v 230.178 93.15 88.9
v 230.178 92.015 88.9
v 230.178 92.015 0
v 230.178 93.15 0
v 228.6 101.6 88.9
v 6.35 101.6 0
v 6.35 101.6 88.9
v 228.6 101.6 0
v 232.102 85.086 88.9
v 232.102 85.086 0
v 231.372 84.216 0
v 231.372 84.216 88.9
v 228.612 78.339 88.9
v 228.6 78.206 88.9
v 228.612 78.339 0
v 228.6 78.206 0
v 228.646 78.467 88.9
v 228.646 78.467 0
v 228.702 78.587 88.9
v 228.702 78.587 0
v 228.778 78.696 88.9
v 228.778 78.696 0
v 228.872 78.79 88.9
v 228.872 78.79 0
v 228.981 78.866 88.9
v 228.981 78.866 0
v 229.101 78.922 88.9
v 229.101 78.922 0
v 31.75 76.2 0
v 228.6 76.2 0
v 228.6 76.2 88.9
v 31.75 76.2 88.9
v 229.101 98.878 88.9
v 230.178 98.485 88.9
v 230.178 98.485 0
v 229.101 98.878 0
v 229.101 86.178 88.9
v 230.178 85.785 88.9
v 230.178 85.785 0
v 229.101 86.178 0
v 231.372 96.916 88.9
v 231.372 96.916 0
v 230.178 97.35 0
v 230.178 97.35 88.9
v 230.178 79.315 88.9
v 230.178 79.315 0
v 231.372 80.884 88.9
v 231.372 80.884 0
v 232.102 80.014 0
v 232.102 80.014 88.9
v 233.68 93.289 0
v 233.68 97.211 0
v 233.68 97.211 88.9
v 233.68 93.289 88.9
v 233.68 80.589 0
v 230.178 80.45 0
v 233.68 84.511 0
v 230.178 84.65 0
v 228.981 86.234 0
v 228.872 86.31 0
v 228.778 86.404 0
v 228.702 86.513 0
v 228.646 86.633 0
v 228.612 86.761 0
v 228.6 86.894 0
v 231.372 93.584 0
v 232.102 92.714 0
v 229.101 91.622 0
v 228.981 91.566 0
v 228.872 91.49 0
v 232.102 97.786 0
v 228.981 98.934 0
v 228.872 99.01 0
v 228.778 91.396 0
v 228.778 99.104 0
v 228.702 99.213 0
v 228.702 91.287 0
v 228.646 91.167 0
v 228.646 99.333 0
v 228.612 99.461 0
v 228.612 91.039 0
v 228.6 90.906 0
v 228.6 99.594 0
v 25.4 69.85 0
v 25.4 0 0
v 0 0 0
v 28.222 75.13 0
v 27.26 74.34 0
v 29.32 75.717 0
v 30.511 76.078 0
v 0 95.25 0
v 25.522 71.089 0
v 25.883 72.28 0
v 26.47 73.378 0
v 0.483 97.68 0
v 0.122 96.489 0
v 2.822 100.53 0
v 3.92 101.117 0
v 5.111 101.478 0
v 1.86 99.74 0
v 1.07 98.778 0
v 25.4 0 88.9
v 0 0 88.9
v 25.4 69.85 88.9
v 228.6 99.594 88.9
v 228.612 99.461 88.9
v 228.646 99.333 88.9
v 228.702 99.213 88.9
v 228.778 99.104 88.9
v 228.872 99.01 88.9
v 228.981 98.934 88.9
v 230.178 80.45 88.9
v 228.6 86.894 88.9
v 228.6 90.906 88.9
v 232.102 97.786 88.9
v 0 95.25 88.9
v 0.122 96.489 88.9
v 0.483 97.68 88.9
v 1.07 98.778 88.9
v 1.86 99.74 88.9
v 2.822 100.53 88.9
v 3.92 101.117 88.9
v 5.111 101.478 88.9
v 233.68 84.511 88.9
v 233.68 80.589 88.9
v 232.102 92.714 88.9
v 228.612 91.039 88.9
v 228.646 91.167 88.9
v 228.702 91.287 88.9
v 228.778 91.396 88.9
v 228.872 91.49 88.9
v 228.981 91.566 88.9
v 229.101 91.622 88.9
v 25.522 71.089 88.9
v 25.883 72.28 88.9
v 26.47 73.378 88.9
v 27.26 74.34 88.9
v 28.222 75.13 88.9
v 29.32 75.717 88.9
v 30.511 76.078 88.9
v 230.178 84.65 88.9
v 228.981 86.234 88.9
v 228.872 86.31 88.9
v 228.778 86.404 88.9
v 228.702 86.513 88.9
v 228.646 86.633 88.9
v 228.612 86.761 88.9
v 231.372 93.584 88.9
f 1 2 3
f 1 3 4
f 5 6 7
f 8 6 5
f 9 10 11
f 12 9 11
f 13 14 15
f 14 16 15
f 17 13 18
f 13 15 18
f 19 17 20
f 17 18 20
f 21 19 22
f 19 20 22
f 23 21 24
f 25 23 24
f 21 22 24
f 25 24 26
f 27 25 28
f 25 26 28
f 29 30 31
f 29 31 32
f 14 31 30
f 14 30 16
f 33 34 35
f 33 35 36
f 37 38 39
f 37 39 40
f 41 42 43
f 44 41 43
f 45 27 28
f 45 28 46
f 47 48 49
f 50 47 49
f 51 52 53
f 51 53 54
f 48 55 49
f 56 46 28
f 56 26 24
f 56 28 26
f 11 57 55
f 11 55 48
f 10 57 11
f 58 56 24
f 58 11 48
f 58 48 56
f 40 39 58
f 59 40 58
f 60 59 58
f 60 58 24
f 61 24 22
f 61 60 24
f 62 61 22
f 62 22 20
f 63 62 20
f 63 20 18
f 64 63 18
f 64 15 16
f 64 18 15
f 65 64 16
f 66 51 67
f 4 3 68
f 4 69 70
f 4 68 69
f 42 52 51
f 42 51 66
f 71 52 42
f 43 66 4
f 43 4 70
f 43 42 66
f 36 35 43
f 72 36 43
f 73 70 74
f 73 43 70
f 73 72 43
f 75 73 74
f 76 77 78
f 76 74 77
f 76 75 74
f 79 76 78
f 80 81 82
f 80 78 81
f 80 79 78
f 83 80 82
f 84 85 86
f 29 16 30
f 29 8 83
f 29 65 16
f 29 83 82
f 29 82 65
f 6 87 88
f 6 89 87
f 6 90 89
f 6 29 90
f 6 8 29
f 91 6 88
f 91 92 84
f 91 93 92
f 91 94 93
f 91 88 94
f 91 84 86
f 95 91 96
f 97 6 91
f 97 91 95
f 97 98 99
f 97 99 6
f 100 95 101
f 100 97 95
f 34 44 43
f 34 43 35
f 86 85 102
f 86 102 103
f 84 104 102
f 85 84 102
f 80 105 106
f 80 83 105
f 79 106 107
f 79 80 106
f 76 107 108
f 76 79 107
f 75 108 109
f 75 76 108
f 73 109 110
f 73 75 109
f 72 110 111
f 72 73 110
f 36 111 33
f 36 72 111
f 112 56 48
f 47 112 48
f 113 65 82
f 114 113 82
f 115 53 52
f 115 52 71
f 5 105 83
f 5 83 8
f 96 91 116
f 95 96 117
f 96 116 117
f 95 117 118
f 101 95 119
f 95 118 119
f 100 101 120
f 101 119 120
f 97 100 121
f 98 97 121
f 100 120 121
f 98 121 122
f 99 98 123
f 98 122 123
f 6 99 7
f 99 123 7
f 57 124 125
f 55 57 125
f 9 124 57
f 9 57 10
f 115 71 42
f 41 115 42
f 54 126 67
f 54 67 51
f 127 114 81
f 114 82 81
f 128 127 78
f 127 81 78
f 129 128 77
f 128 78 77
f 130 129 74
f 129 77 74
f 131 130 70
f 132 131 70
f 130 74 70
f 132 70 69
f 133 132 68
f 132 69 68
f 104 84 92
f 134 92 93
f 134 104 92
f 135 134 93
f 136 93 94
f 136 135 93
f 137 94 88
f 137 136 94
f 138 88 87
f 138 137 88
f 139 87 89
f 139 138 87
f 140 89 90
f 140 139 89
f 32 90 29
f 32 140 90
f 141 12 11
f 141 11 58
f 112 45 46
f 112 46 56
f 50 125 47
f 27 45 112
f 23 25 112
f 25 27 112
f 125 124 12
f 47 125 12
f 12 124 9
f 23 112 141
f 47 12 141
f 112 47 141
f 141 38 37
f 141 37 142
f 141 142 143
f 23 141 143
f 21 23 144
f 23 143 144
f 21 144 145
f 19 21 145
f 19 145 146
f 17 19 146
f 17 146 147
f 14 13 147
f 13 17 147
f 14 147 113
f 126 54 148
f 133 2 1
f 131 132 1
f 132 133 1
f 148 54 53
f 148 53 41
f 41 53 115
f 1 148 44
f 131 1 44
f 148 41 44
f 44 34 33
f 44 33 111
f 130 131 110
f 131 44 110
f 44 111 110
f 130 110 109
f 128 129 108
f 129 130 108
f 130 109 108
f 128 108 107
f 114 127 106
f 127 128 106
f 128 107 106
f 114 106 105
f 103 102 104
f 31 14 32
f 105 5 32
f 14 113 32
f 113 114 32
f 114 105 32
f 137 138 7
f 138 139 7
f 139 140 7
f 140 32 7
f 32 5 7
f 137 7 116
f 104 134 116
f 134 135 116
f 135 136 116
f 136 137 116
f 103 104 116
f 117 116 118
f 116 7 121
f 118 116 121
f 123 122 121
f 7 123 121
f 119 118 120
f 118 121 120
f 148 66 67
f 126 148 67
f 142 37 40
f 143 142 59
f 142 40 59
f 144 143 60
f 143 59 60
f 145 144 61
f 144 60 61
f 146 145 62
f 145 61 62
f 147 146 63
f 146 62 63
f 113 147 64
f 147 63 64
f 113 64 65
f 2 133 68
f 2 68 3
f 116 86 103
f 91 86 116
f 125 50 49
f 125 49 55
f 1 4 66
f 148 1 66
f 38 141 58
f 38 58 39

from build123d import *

# Parameters (mm, degrees)
BOSS_EXTRUDE2_DEPTH = 88.9
CUT_EXTRUDE3_DEPTH  = 89.9
FILLET2_R           = 6.35
FILLET4_R           = 0.762


with BuildPart() as part:
    # Sketch1 → Boss-Extrude2 (new body)
    with BuildSketch(Plane.XY):
        Polygon((0, 0), (0, 101.6), (233.68, 101.6), (233.68, 76.2), (25.4, 76.2), (25.4, 0), align=None)
    extrude(amount=BOSS_EXTRUDE2_DEPTH)

    # Sketch8 → Cut-Extrude3 (cut, through all)
    with BuildSketch(Plane.XY.offset(88.9)):
        Polygon((228.6, 76.2), (228.6, 78.740000094), (230.178469436, 79.314515955), (230.178469436, 80.449652208), (231.371879071, 80.88401777), (232.101530561, 80.014452928), (233.68, 80.58896879), (233.68, 76.2), align=None)
        Polygon((228.6, 101.6), (233.68, 101.6), (233.68, 97.21103121), (232.101530561, 97.785547072), (231.371879071, 96.91598223), (230.178469436, 97.350347792), (230.178469436, 98.485484045), (228.6, 99.059999906), align=None)
        Polygon((228.6, 86.36), (228.6, 91.44), (230.178469436, 92.014515861), (230.178469436, 93.149652114), (231.371879071, 93.584017676), (232.101530561, 92.714452834), (233.68, 93.288968696), (233.68, 84.511031304), (232.101530561, 85.085547166), (231.371879071, 84.215982324), (230.178469436, 84.650347886), (230.178469436, 85.785484139), align=None)
    extrude(amount=-CUT_EXTRUDE3_DEPTH, mode=Mode.SUBTRACT)

    # Fillet2
    fillet2_edges = [part.edges().sort_by_distance(p)[0] for p in [
        (0, 101.6, 44.45),
        (25.4, 76.2, 44.45),
    ]]
    fillet(fillet2_edges, radius=FILLET2_R)

    # Fillet4
    fillet4_edges = [part.edges().sort_by_distance(p)[0] for p in [
        (228.6, 78.740000094, 44.45),
        (228.6, 99.059999906, 44.45),
        (228.6, 91.44, 44.45),
        (228.6, 86.36, 44.45),
    ]]
    fillet(fillet4_edges, radius=FILLET4_R)


solid = part.part
